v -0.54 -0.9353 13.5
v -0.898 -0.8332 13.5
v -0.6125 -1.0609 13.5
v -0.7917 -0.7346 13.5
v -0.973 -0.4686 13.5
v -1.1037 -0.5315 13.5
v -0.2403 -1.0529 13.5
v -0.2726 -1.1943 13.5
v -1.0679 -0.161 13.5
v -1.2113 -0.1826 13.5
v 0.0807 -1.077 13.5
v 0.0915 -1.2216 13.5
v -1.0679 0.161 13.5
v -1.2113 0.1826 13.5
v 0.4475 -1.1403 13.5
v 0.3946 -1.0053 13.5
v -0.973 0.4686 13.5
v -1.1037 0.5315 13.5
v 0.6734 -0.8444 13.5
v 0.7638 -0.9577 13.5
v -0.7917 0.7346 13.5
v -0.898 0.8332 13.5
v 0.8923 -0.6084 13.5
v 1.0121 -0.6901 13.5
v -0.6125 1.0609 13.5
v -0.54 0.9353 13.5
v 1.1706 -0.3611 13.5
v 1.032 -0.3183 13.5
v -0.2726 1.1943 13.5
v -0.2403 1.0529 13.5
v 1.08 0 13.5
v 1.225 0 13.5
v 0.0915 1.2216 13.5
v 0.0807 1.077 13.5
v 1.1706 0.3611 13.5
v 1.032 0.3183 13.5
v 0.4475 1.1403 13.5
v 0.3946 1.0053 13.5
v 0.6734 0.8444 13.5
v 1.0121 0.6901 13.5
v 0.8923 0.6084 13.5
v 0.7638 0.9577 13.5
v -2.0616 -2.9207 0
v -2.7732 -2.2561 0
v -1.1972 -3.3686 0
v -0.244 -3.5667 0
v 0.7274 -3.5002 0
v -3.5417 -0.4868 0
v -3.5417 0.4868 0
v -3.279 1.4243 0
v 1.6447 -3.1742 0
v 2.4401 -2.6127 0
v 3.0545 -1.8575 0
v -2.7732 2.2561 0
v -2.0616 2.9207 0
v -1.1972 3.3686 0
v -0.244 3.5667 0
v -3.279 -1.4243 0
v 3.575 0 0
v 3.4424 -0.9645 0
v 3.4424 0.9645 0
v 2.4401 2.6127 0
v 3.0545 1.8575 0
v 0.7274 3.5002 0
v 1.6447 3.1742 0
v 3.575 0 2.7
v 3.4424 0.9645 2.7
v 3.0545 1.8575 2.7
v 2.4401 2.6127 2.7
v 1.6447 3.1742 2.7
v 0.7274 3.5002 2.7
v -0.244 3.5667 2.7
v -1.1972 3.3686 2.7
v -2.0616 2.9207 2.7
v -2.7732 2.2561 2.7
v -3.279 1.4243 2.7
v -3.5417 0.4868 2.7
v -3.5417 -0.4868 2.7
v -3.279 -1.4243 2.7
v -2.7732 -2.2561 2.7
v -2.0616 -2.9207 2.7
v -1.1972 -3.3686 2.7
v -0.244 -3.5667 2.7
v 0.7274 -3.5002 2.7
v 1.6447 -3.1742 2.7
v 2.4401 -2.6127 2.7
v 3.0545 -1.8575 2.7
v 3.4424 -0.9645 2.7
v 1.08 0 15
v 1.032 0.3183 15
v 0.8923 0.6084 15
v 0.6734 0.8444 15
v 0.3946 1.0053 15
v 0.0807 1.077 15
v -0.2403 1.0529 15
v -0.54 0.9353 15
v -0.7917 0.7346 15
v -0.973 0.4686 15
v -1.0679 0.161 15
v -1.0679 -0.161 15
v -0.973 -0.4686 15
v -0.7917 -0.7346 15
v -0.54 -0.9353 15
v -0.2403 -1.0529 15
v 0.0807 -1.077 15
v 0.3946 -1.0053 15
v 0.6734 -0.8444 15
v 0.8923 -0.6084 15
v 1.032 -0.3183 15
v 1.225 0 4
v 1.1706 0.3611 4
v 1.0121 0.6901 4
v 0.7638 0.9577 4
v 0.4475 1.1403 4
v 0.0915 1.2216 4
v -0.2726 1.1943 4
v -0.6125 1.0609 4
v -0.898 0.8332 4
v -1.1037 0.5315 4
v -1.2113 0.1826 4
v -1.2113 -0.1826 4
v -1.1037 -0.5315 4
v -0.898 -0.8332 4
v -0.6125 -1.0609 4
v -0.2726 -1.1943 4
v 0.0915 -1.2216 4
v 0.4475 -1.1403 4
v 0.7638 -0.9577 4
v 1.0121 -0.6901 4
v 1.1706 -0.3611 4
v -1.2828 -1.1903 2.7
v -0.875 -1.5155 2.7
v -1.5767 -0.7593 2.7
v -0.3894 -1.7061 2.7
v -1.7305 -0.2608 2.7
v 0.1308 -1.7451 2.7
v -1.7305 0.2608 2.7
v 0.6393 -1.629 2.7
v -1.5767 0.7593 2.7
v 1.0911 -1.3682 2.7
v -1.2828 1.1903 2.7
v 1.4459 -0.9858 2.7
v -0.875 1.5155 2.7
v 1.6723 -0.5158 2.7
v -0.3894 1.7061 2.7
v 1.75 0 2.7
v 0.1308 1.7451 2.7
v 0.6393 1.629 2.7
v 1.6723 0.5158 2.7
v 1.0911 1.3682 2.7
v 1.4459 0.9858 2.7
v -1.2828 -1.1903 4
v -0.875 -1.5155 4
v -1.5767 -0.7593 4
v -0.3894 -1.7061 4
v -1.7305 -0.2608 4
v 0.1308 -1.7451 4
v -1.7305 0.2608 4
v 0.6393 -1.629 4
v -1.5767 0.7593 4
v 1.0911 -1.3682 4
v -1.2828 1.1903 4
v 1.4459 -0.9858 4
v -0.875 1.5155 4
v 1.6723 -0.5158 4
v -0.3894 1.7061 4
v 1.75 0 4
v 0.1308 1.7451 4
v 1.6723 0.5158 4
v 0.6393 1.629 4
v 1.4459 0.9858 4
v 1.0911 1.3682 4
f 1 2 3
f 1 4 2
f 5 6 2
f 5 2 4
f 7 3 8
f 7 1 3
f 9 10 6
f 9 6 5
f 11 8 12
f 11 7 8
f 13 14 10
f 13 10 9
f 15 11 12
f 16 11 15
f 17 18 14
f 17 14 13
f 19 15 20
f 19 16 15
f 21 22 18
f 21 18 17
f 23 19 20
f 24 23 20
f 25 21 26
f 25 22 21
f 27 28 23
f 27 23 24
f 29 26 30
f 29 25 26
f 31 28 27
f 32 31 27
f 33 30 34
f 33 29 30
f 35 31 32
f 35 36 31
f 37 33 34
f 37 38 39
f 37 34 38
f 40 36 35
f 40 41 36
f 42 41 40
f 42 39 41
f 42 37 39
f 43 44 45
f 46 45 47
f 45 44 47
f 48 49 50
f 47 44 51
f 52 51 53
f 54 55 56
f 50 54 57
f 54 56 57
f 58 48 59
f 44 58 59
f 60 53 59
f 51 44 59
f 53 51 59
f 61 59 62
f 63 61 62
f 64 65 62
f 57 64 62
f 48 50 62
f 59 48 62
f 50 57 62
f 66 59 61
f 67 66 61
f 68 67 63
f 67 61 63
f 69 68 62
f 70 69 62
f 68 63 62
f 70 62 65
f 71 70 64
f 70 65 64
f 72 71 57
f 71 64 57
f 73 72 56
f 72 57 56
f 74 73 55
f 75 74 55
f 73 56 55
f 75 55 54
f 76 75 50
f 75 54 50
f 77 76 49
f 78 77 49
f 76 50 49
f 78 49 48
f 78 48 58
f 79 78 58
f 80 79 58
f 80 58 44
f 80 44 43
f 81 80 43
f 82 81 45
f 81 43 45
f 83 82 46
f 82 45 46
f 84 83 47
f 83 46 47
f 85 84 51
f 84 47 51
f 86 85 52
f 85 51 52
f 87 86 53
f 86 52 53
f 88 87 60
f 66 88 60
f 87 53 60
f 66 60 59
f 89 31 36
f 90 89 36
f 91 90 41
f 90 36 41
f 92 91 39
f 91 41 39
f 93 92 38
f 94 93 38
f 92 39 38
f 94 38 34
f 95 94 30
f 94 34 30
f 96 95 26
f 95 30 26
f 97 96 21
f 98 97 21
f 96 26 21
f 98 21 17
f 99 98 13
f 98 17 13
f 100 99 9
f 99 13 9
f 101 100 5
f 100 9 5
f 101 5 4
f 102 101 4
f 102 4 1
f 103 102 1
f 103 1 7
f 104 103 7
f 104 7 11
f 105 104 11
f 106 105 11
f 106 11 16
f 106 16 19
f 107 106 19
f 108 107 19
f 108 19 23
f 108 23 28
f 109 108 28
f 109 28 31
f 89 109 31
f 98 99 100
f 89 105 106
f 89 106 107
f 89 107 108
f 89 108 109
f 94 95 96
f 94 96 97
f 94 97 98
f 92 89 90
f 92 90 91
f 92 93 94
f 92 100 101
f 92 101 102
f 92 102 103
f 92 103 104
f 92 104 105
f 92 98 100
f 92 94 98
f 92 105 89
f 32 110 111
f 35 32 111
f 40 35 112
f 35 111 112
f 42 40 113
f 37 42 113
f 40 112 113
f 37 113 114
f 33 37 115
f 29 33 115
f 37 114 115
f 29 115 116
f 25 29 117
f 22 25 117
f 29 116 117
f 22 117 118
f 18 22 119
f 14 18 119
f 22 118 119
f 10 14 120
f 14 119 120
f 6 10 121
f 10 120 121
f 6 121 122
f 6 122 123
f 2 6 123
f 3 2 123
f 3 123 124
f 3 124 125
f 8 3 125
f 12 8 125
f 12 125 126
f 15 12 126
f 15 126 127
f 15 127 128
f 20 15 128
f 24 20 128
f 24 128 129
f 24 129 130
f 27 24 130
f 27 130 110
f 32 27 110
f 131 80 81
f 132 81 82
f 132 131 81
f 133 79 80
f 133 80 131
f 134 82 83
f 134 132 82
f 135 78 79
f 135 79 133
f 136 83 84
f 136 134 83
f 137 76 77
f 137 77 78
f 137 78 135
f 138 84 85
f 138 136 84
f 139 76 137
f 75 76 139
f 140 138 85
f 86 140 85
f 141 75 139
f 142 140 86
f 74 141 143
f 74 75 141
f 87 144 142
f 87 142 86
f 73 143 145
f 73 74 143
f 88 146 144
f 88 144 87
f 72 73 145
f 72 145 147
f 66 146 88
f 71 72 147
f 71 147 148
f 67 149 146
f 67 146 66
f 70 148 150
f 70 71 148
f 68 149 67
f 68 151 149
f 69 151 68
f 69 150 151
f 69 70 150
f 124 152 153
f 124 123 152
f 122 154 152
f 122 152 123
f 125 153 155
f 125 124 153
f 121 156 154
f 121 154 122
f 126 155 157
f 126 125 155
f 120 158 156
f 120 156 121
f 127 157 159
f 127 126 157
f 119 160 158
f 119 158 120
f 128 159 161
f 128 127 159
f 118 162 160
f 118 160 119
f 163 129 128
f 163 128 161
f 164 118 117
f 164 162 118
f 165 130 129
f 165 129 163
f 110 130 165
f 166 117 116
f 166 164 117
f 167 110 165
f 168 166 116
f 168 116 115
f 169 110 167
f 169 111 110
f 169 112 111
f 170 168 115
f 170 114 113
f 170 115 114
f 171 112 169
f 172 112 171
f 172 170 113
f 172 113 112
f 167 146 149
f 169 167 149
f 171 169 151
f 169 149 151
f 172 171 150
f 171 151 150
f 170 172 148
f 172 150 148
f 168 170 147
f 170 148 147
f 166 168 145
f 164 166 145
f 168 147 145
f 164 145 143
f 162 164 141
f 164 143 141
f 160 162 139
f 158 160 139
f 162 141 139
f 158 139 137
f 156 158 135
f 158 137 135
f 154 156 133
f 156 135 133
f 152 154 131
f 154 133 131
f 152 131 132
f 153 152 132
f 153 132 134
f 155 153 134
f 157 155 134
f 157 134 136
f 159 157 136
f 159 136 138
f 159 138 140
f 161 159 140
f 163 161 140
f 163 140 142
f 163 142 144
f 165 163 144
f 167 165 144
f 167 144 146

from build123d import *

# Parameters (mm, degrees)
F0_R     = 1.08
F1_DEPTH = 15
F0_R_2   = 1.225
F2_DEPTH = 13.5
F0_R_3   = 1.75
F3_DEPTH = 4
F0_R_4   = 3.575
F4_DEPTH = 2.7


with BuildPart() as f1:
    # F0 (on Top) → F1 (new body)
    with BuildSketch(Plane.XY):
        Circle(F0_R)
    extrude(amount=F1_DEPTH)

    # F0 (on Top) → F2 (join)
    with BuildSketch(Plane.XY):
        Circle(F0_R_2)
        Circle(F0_R, mode=Mode.SUBTRACT)
    extrude(amount=F2_DEPTH)

    # F0 (on Top) → F3 (join)
    with BuildSketch(Plane.XY):
        Circle(F0_R_3)
        Circle(F0_R_2, mode=Mode.SUBTRACT)
    extrude(amount=F3_DEPTH)

    # F0 (on Top) → F4 (join)
    with BuildSketch(Plane.XY):
        Circle(F0_R_4)
        Circle(F0_R_3, mode=Mode.SUBTRACT)
    extrude(amount=F4_DEPTH)


solid = f1.part
